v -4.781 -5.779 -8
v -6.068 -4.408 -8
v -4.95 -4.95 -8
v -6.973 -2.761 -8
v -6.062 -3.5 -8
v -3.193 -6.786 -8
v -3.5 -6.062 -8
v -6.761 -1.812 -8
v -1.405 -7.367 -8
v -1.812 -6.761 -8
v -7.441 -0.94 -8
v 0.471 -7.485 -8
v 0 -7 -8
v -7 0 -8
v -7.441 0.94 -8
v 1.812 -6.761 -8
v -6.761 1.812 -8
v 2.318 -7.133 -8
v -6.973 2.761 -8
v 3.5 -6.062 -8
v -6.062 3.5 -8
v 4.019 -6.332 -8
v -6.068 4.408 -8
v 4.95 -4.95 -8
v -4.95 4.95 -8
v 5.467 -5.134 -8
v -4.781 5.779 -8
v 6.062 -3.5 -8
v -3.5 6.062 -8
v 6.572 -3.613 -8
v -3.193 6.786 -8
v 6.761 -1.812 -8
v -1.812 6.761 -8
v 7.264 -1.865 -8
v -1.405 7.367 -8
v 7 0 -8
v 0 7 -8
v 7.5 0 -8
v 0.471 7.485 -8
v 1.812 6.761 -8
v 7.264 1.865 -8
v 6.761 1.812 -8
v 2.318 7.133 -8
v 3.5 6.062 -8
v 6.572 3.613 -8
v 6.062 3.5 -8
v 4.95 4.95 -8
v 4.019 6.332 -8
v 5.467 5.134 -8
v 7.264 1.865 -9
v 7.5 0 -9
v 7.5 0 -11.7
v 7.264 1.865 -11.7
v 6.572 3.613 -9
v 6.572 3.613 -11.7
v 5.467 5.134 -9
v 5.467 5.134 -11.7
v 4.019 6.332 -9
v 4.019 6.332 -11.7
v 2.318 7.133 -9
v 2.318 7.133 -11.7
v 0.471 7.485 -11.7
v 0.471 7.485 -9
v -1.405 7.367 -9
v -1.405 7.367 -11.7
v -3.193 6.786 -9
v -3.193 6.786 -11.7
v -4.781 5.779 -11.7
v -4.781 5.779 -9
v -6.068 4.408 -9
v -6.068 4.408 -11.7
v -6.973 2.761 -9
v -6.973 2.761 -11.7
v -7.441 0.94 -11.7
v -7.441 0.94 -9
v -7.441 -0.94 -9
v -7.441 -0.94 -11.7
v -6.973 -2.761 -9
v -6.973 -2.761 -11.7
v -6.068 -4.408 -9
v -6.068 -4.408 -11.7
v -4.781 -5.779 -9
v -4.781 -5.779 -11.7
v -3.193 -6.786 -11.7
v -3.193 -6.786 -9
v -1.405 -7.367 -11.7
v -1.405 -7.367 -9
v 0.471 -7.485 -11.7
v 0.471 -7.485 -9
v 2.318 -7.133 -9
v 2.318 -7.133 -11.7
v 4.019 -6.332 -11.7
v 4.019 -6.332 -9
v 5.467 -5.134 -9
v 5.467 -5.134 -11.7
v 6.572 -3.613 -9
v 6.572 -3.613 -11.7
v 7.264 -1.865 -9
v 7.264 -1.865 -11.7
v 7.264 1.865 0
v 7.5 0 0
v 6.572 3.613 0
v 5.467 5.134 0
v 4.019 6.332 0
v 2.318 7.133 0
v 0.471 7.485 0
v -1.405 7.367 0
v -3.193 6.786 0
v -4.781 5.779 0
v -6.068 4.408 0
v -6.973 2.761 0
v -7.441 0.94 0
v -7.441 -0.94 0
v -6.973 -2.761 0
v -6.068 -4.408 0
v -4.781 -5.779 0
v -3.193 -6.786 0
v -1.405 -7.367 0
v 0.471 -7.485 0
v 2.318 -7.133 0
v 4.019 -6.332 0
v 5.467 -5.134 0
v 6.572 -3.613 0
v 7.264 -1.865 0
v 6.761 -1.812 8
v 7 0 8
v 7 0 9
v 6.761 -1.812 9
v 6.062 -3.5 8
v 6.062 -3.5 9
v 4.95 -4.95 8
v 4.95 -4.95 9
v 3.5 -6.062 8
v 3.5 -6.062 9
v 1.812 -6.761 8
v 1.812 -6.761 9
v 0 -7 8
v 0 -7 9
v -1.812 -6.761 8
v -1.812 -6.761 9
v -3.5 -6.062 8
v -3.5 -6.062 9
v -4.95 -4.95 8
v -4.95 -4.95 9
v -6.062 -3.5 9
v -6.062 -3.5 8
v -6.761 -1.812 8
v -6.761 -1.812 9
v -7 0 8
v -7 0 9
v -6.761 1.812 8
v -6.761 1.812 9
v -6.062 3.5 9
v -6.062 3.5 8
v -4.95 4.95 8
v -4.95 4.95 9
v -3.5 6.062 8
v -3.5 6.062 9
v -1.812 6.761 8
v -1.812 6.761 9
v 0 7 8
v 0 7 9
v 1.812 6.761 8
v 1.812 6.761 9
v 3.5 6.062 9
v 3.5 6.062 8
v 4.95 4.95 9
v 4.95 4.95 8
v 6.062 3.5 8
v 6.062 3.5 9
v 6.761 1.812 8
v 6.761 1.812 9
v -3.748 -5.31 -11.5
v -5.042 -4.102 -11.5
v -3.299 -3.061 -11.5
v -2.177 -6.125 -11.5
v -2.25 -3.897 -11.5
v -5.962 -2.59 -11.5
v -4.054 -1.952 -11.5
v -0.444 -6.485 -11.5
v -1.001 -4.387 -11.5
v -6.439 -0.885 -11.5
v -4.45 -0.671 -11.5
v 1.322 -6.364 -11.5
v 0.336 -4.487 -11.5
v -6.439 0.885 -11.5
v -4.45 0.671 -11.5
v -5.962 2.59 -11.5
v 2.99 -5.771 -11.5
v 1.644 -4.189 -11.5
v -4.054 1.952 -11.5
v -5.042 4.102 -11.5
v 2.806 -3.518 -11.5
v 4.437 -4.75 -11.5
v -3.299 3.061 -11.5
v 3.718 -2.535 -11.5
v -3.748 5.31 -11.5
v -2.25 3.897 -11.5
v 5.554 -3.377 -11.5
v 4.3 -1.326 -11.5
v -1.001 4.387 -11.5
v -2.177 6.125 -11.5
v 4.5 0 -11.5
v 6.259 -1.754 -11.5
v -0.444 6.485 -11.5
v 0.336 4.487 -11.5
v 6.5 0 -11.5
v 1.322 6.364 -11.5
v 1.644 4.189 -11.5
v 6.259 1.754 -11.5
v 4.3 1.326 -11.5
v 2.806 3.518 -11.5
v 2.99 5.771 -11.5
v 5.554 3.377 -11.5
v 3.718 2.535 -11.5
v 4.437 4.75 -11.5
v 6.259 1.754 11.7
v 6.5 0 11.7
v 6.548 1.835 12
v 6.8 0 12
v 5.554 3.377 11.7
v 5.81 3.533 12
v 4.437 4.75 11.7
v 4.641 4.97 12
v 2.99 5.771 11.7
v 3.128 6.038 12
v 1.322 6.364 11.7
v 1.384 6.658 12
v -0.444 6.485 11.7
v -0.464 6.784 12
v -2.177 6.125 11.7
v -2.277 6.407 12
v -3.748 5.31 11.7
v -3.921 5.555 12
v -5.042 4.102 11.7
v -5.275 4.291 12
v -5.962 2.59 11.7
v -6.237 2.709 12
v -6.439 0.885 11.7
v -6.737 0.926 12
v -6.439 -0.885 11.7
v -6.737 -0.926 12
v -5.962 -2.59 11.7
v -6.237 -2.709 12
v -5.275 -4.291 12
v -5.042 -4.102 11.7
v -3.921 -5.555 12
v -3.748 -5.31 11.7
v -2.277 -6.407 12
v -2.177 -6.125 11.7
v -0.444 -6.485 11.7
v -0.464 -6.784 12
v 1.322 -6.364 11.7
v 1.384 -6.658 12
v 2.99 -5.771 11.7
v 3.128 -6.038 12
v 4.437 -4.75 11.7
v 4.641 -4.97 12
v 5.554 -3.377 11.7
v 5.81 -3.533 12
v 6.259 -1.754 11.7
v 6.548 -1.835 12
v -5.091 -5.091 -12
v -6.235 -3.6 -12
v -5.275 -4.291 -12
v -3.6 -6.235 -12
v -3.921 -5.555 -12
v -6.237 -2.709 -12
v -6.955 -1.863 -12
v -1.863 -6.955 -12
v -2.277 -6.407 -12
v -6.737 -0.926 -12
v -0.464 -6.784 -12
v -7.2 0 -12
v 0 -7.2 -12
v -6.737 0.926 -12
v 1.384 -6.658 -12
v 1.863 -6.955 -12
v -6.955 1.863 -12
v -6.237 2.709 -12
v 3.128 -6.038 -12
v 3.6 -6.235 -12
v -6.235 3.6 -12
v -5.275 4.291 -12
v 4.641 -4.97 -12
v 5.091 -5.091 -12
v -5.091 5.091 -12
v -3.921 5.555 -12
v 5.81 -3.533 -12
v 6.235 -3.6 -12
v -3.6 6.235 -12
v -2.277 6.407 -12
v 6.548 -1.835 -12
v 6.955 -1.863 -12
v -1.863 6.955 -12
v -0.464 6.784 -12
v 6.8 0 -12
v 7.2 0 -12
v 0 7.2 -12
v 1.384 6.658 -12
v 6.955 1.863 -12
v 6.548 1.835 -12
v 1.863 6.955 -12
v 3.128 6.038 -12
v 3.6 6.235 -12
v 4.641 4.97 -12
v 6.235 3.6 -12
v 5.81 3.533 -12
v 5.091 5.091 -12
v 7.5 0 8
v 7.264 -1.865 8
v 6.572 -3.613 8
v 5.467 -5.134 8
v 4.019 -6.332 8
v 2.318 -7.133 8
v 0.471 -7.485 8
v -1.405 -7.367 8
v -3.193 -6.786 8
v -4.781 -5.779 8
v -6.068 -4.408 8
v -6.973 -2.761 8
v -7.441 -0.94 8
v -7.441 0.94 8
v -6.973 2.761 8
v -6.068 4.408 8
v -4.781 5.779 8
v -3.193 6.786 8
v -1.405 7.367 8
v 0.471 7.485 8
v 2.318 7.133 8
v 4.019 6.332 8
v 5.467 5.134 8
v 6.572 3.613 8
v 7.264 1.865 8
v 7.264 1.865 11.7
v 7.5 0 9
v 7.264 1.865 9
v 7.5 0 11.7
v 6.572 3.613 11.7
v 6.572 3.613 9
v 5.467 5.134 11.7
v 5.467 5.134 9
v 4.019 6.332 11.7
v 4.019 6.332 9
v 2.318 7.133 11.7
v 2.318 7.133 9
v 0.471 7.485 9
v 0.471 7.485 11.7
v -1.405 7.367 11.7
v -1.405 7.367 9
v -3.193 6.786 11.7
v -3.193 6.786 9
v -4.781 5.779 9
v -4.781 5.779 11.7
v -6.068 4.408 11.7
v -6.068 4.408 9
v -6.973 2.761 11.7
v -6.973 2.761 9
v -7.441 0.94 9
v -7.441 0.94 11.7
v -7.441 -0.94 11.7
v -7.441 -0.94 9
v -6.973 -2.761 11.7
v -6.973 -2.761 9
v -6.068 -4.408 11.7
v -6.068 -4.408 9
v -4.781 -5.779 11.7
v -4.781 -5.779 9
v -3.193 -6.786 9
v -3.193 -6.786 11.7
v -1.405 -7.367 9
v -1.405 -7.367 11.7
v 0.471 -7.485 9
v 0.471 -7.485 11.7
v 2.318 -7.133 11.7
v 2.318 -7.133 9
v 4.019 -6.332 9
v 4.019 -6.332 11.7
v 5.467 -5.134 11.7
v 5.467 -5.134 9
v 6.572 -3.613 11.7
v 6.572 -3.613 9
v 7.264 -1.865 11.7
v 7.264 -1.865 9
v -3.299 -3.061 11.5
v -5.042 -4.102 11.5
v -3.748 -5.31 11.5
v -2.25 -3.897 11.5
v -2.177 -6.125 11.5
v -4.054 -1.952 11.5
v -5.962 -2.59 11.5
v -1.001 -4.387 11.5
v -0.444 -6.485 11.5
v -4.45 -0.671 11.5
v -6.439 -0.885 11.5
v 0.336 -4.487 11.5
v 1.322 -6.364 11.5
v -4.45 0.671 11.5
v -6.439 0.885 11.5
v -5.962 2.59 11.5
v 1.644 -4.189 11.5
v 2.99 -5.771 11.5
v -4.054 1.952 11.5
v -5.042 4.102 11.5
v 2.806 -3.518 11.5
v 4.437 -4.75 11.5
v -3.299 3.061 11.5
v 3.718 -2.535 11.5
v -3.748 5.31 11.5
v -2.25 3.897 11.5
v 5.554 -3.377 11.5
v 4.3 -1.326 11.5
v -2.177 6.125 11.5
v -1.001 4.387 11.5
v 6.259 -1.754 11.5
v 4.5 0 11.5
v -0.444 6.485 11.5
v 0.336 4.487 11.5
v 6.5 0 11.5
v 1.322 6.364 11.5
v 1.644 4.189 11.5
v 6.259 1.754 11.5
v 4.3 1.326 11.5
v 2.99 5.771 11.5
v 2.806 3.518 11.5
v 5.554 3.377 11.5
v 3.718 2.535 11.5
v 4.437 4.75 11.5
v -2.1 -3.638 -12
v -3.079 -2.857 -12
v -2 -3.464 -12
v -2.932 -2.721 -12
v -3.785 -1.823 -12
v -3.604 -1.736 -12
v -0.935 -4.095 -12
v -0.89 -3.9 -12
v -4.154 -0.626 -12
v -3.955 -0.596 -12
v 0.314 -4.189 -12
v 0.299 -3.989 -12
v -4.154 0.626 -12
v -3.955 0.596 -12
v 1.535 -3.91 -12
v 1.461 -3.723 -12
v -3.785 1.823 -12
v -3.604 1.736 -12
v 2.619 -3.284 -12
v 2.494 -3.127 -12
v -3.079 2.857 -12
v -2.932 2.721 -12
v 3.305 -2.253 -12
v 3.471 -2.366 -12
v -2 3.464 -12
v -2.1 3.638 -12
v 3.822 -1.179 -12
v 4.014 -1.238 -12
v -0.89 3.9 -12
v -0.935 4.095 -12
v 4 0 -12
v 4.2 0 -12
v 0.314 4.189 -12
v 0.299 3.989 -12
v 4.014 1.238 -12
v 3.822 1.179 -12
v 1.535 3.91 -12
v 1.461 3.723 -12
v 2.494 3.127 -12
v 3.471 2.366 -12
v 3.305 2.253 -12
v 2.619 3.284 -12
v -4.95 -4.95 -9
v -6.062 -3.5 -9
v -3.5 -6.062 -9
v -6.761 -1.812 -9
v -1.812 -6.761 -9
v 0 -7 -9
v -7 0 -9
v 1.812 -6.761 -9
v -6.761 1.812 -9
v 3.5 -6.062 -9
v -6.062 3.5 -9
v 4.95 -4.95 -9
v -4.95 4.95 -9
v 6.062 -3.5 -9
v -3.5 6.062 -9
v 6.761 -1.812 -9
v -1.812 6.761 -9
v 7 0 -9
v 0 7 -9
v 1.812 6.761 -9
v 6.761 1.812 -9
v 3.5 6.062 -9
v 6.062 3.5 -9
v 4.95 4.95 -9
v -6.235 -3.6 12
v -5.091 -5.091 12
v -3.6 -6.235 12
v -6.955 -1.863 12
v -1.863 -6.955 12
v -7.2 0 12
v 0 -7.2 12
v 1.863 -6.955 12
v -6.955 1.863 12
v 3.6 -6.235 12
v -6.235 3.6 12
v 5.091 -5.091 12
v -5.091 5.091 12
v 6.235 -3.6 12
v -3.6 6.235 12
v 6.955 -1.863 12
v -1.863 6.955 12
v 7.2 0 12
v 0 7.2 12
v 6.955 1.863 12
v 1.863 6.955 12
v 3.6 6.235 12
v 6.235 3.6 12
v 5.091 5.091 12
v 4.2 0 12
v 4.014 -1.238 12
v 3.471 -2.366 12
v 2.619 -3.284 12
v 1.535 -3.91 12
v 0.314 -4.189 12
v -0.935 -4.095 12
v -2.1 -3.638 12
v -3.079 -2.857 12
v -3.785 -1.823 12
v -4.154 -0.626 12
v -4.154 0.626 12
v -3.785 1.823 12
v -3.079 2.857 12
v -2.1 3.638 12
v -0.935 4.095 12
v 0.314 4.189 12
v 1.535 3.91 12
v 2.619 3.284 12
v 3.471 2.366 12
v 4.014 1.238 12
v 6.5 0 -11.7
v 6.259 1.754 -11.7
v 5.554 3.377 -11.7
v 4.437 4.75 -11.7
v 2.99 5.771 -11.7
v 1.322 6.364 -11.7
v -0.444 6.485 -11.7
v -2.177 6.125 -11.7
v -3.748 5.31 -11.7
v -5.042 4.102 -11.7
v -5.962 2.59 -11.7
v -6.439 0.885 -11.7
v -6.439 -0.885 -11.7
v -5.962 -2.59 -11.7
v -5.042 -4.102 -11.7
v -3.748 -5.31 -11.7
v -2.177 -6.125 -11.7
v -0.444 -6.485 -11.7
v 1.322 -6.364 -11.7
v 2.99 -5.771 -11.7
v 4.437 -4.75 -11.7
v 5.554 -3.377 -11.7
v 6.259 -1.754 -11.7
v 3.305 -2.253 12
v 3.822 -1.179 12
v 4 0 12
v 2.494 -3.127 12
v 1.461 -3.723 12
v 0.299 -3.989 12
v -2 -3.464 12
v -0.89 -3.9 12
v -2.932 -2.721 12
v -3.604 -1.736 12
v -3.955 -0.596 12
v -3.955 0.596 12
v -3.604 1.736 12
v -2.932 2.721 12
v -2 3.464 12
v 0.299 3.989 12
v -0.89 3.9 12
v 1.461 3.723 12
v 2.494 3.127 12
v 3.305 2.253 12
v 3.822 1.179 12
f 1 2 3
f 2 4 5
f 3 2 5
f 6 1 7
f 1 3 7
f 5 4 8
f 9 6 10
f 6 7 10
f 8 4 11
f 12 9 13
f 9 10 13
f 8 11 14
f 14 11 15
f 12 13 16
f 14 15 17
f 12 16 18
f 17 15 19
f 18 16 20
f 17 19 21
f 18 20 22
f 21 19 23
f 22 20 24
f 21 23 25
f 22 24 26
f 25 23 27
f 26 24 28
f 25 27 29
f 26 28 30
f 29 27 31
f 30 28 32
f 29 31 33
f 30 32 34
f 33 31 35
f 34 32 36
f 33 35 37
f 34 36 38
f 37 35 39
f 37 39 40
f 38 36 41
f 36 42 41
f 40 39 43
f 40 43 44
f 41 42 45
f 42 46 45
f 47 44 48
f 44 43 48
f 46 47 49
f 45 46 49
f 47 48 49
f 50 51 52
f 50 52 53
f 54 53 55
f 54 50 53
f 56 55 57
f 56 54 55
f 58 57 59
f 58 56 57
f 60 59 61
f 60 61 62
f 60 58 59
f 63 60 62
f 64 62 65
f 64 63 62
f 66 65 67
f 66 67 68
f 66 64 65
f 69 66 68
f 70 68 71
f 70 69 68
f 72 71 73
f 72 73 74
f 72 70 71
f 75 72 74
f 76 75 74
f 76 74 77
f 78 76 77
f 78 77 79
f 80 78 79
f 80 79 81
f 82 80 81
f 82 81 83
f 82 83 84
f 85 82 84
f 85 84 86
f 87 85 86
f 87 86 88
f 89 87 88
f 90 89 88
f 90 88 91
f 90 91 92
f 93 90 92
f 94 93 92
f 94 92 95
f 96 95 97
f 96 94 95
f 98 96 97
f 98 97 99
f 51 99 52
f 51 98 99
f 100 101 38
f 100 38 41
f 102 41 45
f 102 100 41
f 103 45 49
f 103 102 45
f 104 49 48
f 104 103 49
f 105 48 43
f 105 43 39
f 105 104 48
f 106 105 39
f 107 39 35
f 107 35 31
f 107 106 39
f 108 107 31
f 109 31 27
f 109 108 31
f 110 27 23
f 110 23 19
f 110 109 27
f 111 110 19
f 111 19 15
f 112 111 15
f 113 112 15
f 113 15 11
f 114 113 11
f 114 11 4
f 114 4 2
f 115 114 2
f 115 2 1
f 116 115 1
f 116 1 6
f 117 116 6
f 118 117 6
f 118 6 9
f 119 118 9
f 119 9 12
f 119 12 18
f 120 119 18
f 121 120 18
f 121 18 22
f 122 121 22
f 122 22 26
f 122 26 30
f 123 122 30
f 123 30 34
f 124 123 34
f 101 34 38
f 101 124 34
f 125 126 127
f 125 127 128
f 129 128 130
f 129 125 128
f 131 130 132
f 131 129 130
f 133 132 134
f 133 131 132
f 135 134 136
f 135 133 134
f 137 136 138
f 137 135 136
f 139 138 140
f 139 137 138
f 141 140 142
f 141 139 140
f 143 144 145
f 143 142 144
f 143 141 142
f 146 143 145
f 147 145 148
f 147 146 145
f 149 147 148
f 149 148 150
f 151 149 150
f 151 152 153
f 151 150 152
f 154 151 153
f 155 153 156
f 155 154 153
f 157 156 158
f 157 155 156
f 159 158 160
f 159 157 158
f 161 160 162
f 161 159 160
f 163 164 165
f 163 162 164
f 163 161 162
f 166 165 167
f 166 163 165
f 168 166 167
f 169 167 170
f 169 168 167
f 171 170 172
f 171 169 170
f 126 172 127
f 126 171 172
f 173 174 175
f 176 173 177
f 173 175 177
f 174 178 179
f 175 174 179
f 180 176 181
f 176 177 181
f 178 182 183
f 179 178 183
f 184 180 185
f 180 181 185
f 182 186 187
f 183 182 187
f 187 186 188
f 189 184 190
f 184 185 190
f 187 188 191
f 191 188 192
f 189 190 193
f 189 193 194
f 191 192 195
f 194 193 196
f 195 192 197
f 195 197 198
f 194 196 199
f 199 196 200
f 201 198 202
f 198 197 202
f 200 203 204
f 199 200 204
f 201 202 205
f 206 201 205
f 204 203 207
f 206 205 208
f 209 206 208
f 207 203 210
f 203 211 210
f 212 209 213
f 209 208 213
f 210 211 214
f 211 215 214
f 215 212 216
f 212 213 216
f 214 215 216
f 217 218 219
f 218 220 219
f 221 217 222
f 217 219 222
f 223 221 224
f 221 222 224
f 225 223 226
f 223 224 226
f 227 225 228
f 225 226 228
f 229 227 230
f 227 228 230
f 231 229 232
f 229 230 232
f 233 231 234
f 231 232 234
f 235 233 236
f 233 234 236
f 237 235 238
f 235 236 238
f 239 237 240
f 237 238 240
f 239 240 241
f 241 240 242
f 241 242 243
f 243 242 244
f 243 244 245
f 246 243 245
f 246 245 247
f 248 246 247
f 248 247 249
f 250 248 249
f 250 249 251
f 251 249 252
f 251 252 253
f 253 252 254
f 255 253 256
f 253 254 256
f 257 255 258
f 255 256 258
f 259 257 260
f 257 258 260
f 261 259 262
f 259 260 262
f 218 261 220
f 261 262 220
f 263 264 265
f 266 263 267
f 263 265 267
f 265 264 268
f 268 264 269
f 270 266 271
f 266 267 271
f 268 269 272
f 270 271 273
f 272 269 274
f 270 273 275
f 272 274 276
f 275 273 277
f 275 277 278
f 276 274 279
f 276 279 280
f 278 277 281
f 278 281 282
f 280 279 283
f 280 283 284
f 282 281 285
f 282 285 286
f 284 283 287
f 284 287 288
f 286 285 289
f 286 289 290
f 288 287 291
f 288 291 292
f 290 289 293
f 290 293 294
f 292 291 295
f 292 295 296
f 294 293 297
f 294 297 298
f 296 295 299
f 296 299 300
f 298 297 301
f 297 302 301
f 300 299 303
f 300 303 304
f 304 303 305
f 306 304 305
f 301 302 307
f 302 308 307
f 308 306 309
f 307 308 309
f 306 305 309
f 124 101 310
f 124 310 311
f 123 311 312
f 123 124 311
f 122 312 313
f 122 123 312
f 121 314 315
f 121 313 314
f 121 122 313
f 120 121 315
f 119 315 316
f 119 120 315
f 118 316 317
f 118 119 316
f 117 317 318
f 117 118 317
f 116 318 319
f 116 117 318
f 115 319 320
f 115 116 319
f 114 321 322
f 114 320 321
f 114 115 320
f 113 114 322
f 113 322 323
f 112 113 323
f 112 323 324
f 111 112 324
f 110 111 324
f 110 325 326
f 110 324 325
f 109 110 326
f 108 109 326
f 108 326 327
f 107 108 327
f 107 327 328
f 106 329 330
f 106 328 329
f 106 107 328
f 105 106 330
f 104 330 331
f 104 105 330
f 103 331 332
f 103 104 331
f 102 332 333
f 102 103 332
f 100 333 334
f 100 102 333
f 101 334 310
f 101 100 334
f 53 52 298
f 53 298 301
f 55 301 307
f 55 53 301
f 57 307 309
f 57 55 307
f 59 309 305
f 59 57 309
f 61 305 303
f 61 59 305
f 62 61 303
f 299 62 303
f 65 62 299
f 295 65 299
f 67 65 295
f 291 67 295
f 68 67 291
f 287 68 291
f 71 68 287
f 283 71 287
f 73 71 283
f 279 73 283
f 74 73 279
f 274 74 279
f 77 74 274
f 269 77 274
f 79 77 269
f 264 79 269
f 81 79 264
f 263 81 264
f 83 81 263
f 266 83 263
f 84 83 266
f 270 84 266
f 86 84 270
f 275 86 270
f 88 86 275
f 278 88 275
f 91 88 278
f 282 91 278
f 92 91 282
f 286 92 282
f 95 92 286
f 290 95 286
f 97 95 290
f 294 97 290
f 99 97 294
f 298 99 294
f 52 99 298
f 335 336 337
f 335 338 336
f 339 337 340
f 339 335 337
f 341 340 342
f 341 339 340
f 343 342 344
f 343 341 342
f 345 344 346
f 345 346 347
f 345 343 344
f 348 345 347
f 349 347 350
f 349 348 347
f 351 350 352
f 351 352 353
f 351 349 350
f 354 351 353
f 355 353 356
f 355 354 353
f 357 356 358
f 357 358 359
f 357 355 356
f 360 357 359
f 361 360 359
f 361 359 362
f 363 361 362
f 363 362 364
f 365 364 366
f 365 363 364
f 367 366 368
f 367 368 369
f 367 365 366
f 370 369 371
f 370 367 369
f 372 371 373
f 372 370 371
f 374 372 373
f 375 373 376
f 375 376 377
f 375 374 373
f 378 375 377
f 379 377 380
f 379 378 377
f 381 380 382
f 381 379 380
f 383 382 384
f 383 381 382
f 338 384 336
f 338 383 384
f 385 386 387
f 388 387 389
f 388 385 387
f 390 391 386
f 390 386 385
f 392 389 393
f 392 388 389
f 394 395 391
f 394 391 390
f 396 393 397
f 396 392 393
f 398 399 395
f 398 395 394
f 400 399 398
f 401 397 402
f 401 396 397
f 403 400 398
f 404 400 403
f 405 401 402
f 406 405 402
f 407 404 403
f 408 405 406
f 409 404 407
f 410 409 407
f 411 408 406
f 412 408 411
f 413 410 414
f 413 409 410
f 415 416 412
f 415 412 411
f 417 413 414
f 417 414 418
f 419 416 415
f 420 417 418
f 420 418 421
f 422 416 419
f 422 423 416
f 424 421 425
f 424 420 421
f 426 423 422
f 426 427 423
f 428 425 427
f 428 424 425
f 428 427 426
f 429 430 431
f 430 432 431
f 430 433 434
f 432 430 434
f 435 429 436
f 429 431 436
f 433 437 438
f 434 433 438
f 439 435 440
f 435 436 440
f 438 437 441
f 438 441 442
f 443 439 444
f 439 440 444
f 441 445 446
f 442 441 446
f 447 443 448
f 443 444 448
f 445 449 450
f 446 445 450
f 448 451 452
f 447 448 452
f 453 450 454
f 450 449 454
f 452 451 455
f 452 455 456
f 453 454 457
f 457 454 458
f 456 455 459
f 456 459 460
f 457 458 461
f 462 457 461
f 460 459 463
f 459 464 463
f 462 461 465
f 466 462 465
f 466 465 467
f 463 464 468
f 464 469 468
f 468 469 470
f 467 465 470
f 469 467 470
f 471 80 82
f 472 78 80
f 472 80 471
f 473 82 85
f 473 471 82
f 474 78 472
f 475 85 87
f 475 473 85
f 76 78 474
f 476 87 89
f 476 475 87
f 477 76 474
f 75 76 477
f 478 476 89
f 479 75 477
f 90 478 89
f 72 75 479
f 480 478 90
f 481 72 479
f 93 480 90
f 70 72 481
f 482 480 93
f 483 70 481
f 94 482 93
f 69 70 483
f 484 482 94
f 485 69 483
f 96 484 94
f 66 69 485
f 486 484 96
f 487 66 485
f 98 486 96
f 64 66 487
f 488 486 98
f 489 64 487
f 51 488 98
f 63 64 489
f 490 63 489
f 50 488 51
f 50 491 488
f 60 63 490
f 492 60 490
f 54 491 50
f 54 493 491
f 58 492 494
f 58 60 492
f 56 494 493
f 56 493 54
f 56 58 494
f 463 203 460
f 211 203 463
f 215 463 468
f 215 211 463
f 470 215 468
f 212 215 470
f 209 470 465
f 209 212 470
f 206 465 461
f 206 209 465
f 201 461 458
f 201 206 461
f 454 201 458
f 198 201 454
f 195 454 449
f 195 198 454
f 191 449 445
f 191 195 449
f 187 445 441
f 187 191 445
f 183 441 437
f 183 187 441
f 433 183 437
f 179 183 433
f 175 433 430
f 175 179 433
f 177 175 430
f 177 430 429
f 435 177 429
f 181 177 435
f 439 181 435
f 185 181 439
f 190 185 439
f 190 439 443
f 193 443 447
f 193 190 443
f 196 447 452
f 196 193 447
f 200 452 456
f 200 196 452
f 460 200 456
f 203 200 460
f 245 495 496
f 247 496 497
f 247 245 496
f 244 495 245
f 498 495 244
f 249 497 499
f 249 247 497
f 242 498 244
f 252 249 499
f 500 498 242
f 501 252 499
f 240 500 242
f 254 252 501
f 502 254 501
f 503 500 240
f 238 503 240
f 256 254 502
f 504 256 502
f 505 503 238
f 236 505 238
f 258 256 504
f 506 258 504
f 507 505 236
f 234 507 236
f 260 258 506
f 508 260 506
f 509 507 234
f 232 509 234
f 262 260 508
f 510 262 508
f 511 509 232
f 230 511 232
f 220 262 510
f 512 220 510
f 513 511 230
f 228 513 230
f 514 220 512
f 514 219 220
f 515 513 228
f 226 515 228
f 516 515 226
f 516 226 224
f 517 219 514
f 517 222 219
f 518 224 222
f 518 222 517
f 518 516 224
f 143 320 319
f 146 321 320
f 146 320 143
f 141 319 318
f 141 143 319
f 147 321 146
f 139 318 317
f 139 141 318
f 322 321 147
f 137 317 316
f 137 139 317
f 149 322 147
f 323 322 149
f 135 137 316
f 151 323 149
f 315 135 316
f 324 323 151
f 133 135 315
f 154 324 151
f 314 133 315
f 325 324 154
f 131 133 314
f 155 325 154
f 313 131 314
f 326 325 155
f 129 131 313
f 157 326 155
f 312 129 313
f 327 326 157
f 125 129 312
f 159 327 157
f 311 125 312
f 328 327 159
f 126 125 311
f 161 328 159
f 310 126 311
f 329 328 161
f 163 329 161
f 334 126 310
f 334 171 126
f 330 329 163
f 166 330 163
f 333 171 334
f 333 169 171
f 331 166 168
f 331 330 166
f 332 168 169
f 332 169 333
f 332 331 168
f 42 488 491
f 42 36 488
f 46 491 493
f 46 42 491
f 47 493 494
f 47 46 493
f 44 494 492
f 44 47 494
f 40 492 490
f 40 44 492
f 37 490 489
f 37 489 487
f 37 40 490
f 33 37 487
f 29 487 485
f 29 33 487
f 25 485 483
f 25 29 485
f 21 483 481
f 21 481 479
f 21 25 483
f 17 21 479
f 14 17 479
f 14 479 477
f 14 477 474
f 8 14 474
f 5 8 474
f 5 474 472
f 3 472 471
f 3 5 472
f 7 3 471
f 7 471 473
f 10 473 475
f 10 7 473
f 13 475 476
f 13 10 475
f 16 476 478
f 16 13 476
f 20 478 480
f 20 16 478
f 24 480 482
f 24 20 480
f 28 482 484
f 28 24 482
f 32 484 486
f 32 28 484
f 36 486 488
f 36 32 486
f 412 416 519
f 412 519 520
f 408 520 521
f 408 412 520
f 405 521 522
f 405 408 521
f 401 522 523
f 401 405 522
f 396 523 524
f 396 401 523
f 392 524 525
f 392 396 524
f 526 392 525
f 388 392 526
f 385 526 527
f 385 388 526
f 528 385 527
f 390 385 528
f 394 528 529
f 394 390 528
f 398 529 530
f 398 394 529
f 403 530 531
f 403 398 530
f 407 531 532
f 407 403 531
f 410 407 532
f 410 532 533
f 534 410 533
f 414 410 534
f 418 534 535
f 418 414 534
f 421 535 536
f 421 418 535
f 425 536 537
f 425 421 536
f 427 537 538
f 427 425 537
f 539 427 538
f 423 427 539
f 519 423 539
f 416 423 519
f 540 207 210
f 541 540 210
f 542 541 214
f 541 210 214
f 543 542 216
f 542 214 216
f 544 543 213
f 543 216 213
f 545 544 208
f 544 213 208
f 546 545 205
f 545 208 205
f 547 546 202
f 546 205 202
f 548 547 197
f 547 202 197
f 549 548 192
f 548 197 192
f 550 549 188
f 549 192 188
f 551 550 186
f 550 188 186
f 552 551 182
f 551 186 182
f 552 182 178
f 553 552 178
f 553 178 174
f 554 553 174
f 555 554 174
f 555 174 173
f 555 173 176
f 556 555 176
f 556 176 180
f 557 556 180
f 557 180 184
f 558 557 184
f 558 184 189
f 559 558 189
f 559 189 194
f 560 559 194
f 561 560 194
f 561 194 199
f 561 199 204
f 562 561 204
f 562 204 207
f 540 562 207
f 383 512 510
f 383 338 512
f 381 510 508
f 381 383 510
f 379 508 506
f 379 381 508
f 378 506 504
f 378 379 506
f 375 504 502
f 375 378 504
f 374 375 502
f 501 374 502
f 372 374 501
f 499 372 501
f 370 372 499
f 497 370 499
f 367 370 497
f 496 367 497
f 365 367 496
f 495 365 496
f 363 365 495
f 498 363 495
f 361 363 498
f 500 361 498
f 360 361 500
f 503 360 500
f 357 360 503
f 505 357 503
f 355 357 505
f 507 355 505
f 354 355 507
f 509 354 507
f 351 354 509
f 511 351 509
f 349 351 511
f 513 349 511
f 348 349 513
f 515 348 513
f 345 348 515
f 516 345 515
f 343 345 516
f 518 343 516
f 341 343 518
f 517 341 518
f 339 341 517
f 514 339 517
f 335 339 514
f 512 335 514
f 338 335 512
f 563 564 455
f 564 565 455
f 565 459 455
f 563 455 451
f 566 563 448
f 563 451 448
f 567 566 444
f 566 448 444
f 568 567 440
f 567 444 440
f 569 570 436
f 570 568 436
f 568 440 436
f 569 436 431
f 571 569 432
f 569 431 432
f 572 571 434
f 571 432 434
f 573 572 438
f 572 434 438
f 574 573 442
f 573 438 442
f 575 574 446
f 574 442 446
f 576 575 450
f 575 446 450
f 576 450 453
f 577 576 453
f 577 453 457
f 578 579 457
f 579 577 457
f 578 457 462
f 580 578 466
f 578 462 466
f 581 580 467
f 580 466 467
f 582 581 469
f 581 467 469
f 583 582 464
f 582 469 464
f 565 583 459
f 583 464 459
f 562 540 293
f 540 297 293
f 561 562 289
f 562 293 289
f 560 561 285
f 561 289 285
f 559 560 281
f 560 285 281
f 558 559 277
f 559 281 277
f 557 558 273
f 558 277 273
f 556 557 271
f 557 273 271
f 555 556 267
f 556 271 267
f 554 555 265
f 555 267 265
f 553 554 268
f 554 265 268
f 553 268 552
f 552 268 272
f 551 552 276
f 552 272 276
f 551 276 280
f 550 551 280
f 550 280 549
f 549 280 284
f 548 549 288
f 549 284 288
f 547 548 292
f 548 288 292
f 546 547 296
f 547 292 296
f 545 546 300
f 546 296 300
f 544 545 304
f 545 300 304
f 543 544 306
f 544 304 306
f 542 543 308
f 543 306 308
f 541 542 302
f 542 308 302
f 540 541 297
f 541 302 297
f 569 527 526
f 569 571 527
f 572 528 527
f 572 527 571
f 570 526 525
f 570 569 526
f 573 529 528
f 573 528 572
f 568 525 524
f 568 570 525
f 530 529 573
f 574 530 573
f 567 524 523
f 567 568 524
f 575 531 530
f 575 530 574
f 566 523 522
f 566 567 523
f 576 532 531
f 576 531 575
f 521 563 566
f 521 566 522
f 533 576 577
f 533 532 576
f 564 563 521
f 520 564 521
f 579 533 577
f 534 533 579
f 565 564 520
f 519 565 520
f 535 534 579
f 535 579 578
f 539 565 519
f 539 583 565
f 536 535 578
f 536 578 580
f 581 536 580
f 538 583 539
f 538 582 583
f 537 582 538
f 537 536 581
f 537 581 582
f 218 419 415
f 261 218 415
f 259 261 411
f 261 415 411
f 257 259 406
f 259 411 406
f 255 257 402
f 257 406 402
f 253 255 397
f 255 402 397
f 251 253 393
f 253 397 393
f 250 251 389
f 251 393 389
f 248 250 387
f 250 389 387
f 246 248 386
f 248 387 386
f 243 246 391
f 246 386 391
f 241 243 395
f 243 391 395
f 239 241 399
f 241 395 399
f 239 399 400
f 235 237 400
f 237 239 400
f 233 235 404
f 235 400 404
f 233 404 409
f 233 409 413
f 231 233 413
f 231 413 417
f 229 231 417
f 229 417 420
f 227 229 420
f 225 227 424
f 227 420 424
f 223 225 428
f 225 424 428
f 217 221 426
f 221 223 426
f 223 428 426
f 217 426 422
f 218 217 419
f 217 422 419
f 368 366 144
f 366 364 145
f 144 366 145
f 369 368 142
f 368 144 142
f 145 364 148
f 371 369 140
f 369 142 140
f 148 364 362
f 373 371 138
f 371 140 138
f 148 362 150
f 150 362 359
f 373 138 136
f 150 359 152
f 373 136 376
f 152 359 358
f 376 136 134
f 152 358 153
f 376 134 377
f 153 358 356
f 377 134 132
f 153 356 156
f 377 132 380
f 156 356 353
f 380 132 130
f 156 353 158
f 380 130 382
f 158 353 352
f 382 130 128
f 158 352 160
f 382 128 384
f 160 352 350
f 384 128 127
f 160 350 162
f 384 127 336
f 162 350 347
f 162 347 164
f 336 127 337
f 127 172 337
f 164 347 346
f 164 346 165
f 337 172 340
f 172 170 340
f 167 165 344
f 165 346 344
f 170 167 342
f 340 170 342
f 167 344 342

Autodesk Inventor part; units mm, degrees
ref_plane "YZ Plane" through (0, 0, 0) normal (1, 0, 0) x (0, 1, 0)
ref_plane "XZ Plane" through (0, 0, 0) normal (0, 1, 0) x (-1, 0, 0)
ref_plane "XY Plane" through (0, 0, 0) normal (0, 0, 1) x (1, 0, 0)
sketch "Эскиз1" plane through (0, 0, 0) normal (0, 0, 1) x (1, 0, 0)
  circle A0 centre (0, 0) radius 4
  circle A1 centre (0, 0) radius 7.5
  circle A2 centre (0, 0) radius 6.5
  circle A3 centre (0, 0) radius 4.5
  circle A4 centre (0, 0) radius 7
  dimension "d0" = 8
  dimension "d1" = 15
  dimension "d2" = 1
  dimension "d3" = 0.5
  dimension "d25" = 0.5
extrude "Выдавливание1" add sketch "Эскиз1" along normal mid plane 24 contours A3
extrude "Выдавливание2" add sketch "Эскиз1" along normal mid plane 23 contours A2
extrude "Выдавливание3" add sketch "Эскиз1" along normal mid plane 24 contours A1 | A4
chamfer "Фаска1" distance 0.3 angle 45 1 edges at (-6.5, 0, 12)
chamfer "Фаска2" distance 0.3 angle 45 1 edges at (-7.5, 0, 12)
chamfer "Фаска3" distance 0.3 angle 45 2 edges at (-7.5, 0, -12) (-6.5, 0, -12)
chamfer "Фаска4" distance 0.3 distance2 0.5 1 edges at (-4.5, 0, -12) measured on face at (4.251, -0.6781, -12)
chamfer "Фаска5" distance 0.3 distance2 0.5 1 edges at (-4.5, 0, 12) measured on face at (4.251, -0.6781, 12)
extrude "Выдавливание4" cut sketch "Эскиз1" along normal mid plane 18 contours A1
extrude "Выдавливание5" add sketch "Эскиз1" along normal mid plane 16 contours A1
properties part number "линейный подшипник 8х15х24"
